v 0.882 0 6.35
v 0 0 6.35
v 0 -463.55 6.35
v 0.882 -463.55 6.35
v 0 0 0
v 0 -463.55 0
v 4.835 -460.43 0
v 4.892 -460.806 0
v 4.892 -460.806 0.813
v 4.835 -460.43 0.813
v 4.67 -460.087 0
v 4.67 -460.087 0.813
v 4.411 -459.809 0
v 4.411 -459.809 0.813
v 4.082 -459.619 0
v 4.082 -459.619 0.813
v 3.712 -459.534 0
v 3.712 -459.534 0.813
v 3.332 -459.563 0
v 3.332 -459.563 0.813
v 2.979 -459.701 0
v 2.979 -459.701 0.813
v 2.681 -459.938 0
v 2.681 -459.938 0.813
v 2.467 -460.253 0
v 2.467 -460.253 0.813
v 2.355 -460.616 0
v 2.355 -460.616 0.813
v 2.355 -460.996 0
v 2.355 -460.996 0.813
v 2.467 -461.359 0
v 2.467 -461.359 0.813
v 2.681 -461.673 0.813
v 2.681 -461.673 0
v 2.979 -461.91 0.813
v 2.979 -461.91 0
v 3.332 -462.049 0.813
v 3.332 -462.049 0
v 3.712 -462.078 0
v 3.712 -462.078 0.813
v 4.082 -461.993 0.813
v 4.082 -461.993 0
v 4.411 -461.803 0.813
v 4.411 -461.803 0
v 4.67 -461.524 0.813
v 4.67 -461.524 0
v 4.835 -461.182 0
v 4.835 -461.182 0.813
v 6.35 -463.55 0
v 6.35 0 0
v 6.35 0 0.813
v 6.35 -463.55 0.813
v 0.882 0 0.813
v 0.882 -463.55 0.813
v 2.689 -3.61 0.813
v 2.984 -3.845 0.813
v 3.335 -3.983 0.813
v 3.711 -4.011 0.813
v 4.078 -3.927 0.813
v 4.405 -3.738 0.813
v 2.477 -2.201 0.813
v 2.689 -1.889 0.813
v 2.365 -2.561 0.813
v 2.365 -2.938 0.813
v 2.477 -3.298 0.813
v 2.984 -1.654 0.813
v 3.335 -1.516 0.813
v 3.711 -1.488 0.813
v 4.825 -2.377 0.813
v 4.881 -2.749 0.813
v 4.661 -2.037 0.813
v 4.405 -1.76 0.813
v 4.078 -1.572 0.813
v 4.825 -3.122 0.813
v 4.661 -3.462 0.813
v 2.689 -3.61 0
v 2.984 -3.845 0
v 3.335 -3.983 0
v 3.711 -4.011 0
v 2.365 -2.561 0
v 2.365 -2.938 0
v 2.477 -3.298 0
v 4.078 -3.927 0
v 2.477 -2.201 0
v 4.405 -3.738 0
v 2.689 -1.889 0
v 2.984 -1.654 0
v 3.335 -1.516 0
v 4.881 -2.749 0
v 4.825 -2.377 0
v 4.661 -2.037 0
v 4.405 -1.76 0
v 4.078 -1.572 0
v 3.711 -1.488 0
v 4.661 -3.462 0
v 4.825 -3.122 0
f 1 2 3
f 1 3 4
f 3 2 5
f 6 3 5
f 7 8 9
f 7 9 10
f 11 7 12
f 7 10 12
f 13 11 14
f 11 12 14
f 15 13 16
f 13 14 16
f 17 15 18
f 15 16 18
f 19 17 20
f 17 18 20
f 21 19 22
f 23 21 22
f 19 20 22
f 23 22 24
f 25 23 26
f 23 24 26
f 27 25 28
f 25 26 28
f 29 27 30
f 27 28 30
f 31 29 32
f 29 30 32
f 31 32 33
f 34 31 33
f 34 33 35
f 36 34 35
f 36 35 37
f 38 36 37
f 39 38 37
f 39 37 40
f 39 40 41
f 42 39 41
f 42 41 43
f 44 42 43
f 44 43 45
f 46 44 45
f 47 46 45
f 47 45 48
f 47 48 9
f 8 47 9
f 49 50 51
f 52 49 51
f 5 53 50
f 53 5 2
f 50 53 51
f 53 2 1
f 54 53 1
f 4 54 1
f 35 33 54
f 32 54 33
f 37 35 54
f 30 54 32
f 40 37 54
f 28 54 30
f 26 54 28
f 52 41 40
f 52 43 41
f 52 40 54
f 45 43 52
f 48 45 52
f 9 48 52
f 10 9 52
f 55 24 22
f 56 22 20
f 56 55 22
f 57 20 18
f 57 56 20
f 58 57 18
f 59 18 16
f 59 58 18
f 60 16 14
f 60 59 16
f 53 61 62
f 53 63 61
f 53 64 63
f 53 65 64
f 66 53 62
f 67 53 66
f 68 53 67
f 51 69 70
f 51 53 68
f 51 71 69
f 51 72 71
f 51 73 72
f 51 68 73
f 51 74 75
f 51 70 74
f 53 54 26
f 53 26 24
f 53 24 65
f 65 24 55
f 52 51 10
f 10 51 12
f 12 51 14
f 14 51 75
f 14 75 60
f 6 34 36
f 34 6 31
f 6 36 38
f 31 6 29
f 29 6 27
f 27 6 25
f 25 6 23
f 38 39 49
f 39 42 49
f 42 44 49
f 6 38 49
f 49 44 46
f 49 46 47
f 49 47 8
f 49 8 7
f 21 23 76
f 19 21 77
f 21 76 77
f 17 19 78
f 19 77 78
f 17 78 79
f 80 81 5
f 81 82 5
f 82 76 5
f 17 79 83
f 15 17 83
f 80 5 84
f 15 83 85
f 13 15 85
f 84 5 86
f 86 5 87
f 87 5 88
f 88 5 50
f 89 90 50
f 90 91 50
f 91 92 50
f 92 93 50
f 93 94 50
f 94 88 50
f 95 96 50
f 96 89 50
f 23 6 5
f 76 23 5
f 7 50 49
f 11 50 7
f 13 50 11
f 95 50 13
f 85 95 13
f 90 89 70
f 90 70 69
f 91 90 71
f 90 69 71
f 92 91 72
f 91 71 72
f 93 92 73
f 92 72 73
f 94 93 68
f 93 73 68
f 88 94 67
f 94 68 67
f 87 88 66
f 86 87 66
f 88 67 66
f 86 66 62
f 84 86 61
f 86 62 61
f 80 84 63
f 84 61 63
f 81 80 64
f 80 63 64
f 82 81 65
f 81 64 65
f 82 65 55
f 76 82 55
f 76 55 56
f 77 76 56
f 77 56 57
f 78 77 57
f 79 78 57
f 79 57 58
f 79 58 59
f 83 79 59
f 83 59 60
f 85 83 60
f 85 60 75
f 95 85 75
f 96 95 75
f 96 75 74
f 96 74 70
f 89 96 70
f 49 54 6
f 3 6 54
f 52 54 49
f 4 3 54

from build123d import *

# Parameters (mm, degrees)
F0_W     = 0.882425
F0_H     = 5.536785
F0_W_2   = 5.467575
F0_H_2   = 0.813215
F1_DEPTH = 463.55
F2_R     = 1.264941
F3_DEPTH = 25.4
F4_R     = 1.275366
F5_DEPTH = 25.4


with BuildPart() as f1:
    # F0 (on Front) → F1 (new body)
    with BuildSketch(Plane.XZ):
        with Locations((0.441213, 3.581607)):
            Rectangle(F0_W, F0_H)
        with Locations((3.616212, 0.406607)):
            Rectangle(F0_W_2, F0_H_2)
        with Locations((0.441213, 0.406607)):
            Rectangle(F0_W, F0_H_2)
    extrude(amount=F1_DEPTH)

    # F2 (on face) → F3 (cut)
    with BuildSketch(Plane.XY.offset(0.813215)):
        with Locations((3.616212, -2.749367)):
            Circle(F2_R)
    extrude(amount=-F3_DEPTH, mode=Mode.SUBTRACT)

    # F4 (on face) → F5 (cut)
    with BuildSketch(Plane.XY.offset(0.813215)):
        with Locations((3.616212, -460.805912)):
            Circle(F4_R)
    extrude(amount=-F5_DEPTH, mode=Mode.SUBTRACT)


solid = f1.part
